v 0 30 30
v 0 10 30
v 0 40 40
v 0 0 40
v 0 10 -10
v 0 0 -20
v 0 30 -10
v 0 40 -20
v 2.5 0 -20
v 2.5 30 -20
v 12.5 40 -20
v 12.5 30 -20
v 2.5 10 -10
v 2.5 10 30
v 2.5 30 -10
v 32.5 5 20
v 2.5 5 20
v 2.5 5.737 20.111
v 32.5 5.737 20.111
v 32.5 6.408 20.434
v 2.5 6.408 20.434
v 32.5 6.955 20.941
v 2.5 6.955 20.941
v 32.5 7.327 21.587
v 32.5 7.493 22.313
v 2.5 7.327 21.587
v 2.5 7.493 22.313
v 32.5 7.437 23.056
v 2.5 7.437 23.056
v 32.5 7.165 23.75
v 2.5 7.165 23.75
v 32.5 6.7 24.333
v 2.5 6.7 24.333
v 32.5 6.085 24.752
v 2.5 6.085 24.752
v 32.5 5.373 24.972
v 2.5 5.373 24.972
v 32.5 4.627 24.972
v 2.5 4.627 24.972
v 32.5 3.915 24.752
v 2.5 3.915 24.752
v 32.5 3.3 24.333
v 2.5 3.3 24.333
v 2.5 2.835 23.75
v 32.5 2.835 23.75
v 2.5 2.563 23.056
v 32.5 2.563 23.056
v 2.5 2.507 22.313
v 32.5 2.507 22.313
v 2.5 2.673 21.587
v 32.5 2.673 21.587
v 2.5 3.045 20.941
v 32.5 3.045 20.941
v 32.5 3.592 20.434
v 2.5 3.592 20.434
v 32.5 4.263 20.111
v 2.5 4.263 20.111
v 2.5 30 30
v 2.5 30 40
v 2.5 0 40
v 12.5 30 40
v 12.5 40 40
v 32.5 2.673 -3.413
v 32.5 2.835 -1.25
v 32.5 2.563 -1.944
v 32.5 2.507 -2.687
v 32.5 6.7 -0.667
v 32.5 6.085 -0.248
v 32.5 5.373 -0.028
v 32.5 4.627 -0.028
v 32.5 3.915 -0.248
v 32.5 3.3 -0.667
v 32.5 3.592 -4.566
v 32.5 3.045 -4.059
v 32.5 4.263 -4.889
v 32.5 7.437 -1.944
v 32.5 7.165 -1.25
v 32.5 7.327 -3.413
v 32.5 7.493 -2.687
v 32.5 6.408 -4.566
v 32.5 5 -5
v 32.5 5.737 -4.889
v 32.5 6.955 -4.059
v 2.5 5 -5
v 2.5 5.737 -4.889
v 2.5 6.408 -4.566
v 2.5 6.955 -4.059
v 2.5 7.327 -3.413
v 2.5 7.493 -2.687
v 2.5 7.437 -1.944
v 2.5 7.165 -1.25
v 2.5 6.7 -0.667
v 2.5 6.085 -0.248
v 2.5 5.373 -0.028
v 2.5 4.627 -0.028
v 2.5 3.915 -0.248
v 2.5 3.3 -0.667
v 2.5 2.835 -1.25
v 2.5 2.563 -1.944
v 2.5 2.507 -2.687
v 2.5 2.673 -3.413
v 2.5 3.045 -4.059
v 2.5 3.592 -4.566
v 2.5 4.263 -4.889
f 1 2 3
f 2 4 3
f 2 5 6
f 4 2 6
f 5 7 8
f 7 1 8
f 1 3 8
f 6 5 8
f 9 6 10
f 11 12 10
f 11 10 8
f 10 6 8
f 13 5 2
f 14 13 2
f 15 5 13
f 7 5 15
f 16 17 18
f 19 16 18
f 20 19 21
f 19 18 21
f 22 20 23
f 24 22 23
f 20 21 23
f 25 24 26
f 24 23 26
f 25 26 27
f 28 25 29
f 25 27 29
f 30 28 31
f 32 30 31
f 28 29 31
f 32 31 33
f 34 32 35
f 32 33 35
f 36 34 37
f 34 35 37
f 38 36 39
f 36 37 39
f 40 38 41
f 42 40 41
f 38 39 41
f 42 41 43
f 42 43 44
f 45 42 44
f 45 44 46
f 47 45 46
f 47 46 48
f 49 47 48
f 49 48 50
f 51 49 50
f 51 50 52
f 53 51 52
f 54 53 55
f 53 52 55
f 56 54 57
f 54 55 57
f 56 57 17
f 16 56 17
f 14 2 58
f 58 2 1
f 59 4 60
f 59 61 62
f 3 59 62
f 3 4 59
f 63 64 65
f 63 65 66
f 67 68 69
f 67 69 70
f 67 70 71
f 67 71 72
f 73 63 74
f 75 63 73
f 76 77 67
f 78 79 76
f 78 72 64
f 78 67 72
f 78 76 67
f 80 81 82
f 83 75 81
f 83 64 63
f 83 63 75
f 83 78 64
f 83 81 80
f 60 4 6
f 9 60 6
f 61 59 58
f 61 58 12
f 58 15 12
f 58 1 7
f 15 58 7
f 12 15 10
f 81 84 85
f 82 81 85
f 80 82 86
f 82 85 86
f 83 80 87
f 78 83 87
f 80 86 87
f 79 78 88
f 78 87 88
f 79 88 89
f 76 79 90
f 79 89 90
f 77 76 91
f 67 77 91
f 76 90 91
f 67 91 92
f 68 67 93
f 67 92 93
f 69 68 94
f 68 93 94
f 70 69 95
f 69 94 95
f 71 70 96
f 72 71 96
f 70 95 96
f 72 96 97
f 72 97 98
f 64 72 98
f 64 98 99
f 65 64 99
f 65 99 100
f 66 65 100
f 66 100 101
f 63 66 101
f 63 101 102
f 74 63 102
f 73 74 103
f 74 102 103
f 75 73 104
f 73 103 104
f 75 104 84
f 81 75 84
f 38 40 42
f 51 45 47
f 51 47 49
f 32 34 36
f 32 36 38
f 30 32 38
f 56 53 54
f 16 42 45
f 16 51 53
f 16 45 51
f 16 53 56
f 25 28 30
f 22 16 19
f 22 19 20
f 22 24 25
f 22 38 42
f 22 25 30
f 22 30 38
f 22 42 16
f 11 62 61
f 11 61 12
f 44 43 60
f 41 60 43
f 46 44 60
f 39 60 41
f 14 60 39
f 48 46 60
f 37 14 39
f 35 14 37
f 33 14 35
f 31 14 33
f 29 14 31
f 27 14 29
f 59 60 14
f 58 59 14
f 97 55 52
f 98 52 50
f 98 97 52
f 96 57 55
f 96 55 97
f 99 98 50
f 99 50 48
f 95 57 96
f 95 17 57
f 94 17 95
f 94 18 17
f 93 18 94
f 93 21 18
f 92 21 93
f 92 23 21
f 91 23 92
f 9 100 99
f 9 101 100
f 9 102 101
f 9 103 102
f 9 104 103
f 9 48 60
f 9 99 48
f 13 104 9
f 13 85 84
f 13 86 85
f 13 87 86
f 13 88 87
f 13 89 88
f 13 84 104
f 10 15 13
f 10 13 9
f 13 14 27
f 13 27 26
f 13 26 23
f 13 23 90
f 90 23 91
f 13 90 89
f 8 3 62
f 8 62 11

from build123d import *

# Parameters (mm, degrees)
SKETCH2_W           = 80
SKETCH2_H           = 40
BOSS_EXTRUDE1_DEPTH = 7.5
SKETCH3_W           = 80
SKETCH3_H           = 18.5
CUT_EXTRUDE1_DEPTH  = 5
SKETCH9_W           = 80
SKETCH9_H           = 16.5
CUT_EXTRUDE5_DEPTH  = 5
SKETCH10_W          = 20
SKETCH10_H          = 40
CUT_EXTRUDE7_DEPTH  = 10
SKETCH12_W          = 40
SKETCH12_H          = 20
CUT_EXTRUDE8_DEPTH  = 10
SKETCH13_W          = 60
SKETCH13_H          = 5
BOSS_EXTRUDE5_DEPTH = 10
SKETCH14_W          = 60
SKETCH14_H          = 5
BOSS_EXTRUDE6_DEPTH = 5
SKETCH15_R          = 2.5
BOSS_EXTRUDE7_DEPTH = 30


with BuildPart() as part:
    # Sketch2 → Boss-Extrude1 (new body)
    with BuildSketch(Plane(origin=(0, 0, 0), x_dir=(0, 0, -1), z_dir=(1, 0, 0))):
        with Locations((0, 20)):
            Rectangle(SKETCH2_W, SKETCH2_H)
    extrude(amount=BOSS_EXTRUDE1_DEPTH)

    # Sketch3 → Cut-Extrude1 (cut)
    with BuildSketch(Plane(origin=(7.5, 0, 0), x_dir=(0, 0, -1), z_dir=(1, 0, 0))):
        with Locations((0, 9.25)):
            Rectangle(SKETCH3_W, SKETCH3_H)
    extrude(amount=-CUT_EXTRUDE1_DEPTH, mode=Mode.SUBTRACT)

    # Sketch9 → Cut-Extrude5 (cut)
    with BuildSketch(Plane(origin=(7.5, 0, 0), x_dir=(0, 0, -1), z_dir=(1, 0, 0))):
        with Locations((0, 26.75)):
            Rectangle(SKETCH9_W, SKETCH9_H)
    extrude(amount=-CUT_EXTRUDE5_DEPTH, mode=Mode.SUBTRACT)

    # Sketch10 → Cut-Extrude7 (cut)
    with BuildSketch(Plane.ZY):
        with Locations((-30, 20)):
            Rectangle(SKETCH10_W, SKETCH10_H)
    extrude(amount=-CUT_EXTRUDE7_DEPTH, mode=Mode.SUBTRACT)

    # Sketch12 → Cut-Extrude8 (cut)
    with BuildSketch(Plane.ZY):
        with Locations((10, 20)):
            Rectangle(SKETCH12_W, SKETCH12_H)
    extrude(amount=-CUT_EXTRUDE8_DEPTH, mode=Mode.SUBTRACT)

    # Sketch13 → Boss-Extrude5 (add)
    with BuildSketch(Plane(origin=(2.5, 0, 0), x_dir=(0, 0, -1), z_dir=(1, 0, 0))):
        with Locations((-10, 32.5)):
            Rectangle(SKETCH13_W, SKETCH13_H)
    extrude(amount=BOSS_EXTRUDE5_DEPTH)

    # Sketch14 → Boss-Extrude6 (add)
    with BuildSketch(Plane(origin=(7.5, 0, 0), x_dir=(0, 0, -1), z_dir=(1, 0, 0))):
        with Locations((-10, 37.5)):
            Rectangle(SKETCH14_W, SKETCH14_H)
    extrude(amount=BOSS_EXTRUDE6_DEPTH)

    # Sketch15 → Boss-Extrude7 (add)
    with BuildSketch(Plane(origin=(2.5, 0, 0), x_dir=(0, 0, -1), z_dir=(1, 0, 0))):
        with Locations((-22.5, 5)):
            Circle(SKETCH15_R)
        with Locations((2.5, 5)):
            Circle(SKETCH15_R)
    extrude(amount=BOSS_EXTRUDE7_DEPTH)


solid = part.part
